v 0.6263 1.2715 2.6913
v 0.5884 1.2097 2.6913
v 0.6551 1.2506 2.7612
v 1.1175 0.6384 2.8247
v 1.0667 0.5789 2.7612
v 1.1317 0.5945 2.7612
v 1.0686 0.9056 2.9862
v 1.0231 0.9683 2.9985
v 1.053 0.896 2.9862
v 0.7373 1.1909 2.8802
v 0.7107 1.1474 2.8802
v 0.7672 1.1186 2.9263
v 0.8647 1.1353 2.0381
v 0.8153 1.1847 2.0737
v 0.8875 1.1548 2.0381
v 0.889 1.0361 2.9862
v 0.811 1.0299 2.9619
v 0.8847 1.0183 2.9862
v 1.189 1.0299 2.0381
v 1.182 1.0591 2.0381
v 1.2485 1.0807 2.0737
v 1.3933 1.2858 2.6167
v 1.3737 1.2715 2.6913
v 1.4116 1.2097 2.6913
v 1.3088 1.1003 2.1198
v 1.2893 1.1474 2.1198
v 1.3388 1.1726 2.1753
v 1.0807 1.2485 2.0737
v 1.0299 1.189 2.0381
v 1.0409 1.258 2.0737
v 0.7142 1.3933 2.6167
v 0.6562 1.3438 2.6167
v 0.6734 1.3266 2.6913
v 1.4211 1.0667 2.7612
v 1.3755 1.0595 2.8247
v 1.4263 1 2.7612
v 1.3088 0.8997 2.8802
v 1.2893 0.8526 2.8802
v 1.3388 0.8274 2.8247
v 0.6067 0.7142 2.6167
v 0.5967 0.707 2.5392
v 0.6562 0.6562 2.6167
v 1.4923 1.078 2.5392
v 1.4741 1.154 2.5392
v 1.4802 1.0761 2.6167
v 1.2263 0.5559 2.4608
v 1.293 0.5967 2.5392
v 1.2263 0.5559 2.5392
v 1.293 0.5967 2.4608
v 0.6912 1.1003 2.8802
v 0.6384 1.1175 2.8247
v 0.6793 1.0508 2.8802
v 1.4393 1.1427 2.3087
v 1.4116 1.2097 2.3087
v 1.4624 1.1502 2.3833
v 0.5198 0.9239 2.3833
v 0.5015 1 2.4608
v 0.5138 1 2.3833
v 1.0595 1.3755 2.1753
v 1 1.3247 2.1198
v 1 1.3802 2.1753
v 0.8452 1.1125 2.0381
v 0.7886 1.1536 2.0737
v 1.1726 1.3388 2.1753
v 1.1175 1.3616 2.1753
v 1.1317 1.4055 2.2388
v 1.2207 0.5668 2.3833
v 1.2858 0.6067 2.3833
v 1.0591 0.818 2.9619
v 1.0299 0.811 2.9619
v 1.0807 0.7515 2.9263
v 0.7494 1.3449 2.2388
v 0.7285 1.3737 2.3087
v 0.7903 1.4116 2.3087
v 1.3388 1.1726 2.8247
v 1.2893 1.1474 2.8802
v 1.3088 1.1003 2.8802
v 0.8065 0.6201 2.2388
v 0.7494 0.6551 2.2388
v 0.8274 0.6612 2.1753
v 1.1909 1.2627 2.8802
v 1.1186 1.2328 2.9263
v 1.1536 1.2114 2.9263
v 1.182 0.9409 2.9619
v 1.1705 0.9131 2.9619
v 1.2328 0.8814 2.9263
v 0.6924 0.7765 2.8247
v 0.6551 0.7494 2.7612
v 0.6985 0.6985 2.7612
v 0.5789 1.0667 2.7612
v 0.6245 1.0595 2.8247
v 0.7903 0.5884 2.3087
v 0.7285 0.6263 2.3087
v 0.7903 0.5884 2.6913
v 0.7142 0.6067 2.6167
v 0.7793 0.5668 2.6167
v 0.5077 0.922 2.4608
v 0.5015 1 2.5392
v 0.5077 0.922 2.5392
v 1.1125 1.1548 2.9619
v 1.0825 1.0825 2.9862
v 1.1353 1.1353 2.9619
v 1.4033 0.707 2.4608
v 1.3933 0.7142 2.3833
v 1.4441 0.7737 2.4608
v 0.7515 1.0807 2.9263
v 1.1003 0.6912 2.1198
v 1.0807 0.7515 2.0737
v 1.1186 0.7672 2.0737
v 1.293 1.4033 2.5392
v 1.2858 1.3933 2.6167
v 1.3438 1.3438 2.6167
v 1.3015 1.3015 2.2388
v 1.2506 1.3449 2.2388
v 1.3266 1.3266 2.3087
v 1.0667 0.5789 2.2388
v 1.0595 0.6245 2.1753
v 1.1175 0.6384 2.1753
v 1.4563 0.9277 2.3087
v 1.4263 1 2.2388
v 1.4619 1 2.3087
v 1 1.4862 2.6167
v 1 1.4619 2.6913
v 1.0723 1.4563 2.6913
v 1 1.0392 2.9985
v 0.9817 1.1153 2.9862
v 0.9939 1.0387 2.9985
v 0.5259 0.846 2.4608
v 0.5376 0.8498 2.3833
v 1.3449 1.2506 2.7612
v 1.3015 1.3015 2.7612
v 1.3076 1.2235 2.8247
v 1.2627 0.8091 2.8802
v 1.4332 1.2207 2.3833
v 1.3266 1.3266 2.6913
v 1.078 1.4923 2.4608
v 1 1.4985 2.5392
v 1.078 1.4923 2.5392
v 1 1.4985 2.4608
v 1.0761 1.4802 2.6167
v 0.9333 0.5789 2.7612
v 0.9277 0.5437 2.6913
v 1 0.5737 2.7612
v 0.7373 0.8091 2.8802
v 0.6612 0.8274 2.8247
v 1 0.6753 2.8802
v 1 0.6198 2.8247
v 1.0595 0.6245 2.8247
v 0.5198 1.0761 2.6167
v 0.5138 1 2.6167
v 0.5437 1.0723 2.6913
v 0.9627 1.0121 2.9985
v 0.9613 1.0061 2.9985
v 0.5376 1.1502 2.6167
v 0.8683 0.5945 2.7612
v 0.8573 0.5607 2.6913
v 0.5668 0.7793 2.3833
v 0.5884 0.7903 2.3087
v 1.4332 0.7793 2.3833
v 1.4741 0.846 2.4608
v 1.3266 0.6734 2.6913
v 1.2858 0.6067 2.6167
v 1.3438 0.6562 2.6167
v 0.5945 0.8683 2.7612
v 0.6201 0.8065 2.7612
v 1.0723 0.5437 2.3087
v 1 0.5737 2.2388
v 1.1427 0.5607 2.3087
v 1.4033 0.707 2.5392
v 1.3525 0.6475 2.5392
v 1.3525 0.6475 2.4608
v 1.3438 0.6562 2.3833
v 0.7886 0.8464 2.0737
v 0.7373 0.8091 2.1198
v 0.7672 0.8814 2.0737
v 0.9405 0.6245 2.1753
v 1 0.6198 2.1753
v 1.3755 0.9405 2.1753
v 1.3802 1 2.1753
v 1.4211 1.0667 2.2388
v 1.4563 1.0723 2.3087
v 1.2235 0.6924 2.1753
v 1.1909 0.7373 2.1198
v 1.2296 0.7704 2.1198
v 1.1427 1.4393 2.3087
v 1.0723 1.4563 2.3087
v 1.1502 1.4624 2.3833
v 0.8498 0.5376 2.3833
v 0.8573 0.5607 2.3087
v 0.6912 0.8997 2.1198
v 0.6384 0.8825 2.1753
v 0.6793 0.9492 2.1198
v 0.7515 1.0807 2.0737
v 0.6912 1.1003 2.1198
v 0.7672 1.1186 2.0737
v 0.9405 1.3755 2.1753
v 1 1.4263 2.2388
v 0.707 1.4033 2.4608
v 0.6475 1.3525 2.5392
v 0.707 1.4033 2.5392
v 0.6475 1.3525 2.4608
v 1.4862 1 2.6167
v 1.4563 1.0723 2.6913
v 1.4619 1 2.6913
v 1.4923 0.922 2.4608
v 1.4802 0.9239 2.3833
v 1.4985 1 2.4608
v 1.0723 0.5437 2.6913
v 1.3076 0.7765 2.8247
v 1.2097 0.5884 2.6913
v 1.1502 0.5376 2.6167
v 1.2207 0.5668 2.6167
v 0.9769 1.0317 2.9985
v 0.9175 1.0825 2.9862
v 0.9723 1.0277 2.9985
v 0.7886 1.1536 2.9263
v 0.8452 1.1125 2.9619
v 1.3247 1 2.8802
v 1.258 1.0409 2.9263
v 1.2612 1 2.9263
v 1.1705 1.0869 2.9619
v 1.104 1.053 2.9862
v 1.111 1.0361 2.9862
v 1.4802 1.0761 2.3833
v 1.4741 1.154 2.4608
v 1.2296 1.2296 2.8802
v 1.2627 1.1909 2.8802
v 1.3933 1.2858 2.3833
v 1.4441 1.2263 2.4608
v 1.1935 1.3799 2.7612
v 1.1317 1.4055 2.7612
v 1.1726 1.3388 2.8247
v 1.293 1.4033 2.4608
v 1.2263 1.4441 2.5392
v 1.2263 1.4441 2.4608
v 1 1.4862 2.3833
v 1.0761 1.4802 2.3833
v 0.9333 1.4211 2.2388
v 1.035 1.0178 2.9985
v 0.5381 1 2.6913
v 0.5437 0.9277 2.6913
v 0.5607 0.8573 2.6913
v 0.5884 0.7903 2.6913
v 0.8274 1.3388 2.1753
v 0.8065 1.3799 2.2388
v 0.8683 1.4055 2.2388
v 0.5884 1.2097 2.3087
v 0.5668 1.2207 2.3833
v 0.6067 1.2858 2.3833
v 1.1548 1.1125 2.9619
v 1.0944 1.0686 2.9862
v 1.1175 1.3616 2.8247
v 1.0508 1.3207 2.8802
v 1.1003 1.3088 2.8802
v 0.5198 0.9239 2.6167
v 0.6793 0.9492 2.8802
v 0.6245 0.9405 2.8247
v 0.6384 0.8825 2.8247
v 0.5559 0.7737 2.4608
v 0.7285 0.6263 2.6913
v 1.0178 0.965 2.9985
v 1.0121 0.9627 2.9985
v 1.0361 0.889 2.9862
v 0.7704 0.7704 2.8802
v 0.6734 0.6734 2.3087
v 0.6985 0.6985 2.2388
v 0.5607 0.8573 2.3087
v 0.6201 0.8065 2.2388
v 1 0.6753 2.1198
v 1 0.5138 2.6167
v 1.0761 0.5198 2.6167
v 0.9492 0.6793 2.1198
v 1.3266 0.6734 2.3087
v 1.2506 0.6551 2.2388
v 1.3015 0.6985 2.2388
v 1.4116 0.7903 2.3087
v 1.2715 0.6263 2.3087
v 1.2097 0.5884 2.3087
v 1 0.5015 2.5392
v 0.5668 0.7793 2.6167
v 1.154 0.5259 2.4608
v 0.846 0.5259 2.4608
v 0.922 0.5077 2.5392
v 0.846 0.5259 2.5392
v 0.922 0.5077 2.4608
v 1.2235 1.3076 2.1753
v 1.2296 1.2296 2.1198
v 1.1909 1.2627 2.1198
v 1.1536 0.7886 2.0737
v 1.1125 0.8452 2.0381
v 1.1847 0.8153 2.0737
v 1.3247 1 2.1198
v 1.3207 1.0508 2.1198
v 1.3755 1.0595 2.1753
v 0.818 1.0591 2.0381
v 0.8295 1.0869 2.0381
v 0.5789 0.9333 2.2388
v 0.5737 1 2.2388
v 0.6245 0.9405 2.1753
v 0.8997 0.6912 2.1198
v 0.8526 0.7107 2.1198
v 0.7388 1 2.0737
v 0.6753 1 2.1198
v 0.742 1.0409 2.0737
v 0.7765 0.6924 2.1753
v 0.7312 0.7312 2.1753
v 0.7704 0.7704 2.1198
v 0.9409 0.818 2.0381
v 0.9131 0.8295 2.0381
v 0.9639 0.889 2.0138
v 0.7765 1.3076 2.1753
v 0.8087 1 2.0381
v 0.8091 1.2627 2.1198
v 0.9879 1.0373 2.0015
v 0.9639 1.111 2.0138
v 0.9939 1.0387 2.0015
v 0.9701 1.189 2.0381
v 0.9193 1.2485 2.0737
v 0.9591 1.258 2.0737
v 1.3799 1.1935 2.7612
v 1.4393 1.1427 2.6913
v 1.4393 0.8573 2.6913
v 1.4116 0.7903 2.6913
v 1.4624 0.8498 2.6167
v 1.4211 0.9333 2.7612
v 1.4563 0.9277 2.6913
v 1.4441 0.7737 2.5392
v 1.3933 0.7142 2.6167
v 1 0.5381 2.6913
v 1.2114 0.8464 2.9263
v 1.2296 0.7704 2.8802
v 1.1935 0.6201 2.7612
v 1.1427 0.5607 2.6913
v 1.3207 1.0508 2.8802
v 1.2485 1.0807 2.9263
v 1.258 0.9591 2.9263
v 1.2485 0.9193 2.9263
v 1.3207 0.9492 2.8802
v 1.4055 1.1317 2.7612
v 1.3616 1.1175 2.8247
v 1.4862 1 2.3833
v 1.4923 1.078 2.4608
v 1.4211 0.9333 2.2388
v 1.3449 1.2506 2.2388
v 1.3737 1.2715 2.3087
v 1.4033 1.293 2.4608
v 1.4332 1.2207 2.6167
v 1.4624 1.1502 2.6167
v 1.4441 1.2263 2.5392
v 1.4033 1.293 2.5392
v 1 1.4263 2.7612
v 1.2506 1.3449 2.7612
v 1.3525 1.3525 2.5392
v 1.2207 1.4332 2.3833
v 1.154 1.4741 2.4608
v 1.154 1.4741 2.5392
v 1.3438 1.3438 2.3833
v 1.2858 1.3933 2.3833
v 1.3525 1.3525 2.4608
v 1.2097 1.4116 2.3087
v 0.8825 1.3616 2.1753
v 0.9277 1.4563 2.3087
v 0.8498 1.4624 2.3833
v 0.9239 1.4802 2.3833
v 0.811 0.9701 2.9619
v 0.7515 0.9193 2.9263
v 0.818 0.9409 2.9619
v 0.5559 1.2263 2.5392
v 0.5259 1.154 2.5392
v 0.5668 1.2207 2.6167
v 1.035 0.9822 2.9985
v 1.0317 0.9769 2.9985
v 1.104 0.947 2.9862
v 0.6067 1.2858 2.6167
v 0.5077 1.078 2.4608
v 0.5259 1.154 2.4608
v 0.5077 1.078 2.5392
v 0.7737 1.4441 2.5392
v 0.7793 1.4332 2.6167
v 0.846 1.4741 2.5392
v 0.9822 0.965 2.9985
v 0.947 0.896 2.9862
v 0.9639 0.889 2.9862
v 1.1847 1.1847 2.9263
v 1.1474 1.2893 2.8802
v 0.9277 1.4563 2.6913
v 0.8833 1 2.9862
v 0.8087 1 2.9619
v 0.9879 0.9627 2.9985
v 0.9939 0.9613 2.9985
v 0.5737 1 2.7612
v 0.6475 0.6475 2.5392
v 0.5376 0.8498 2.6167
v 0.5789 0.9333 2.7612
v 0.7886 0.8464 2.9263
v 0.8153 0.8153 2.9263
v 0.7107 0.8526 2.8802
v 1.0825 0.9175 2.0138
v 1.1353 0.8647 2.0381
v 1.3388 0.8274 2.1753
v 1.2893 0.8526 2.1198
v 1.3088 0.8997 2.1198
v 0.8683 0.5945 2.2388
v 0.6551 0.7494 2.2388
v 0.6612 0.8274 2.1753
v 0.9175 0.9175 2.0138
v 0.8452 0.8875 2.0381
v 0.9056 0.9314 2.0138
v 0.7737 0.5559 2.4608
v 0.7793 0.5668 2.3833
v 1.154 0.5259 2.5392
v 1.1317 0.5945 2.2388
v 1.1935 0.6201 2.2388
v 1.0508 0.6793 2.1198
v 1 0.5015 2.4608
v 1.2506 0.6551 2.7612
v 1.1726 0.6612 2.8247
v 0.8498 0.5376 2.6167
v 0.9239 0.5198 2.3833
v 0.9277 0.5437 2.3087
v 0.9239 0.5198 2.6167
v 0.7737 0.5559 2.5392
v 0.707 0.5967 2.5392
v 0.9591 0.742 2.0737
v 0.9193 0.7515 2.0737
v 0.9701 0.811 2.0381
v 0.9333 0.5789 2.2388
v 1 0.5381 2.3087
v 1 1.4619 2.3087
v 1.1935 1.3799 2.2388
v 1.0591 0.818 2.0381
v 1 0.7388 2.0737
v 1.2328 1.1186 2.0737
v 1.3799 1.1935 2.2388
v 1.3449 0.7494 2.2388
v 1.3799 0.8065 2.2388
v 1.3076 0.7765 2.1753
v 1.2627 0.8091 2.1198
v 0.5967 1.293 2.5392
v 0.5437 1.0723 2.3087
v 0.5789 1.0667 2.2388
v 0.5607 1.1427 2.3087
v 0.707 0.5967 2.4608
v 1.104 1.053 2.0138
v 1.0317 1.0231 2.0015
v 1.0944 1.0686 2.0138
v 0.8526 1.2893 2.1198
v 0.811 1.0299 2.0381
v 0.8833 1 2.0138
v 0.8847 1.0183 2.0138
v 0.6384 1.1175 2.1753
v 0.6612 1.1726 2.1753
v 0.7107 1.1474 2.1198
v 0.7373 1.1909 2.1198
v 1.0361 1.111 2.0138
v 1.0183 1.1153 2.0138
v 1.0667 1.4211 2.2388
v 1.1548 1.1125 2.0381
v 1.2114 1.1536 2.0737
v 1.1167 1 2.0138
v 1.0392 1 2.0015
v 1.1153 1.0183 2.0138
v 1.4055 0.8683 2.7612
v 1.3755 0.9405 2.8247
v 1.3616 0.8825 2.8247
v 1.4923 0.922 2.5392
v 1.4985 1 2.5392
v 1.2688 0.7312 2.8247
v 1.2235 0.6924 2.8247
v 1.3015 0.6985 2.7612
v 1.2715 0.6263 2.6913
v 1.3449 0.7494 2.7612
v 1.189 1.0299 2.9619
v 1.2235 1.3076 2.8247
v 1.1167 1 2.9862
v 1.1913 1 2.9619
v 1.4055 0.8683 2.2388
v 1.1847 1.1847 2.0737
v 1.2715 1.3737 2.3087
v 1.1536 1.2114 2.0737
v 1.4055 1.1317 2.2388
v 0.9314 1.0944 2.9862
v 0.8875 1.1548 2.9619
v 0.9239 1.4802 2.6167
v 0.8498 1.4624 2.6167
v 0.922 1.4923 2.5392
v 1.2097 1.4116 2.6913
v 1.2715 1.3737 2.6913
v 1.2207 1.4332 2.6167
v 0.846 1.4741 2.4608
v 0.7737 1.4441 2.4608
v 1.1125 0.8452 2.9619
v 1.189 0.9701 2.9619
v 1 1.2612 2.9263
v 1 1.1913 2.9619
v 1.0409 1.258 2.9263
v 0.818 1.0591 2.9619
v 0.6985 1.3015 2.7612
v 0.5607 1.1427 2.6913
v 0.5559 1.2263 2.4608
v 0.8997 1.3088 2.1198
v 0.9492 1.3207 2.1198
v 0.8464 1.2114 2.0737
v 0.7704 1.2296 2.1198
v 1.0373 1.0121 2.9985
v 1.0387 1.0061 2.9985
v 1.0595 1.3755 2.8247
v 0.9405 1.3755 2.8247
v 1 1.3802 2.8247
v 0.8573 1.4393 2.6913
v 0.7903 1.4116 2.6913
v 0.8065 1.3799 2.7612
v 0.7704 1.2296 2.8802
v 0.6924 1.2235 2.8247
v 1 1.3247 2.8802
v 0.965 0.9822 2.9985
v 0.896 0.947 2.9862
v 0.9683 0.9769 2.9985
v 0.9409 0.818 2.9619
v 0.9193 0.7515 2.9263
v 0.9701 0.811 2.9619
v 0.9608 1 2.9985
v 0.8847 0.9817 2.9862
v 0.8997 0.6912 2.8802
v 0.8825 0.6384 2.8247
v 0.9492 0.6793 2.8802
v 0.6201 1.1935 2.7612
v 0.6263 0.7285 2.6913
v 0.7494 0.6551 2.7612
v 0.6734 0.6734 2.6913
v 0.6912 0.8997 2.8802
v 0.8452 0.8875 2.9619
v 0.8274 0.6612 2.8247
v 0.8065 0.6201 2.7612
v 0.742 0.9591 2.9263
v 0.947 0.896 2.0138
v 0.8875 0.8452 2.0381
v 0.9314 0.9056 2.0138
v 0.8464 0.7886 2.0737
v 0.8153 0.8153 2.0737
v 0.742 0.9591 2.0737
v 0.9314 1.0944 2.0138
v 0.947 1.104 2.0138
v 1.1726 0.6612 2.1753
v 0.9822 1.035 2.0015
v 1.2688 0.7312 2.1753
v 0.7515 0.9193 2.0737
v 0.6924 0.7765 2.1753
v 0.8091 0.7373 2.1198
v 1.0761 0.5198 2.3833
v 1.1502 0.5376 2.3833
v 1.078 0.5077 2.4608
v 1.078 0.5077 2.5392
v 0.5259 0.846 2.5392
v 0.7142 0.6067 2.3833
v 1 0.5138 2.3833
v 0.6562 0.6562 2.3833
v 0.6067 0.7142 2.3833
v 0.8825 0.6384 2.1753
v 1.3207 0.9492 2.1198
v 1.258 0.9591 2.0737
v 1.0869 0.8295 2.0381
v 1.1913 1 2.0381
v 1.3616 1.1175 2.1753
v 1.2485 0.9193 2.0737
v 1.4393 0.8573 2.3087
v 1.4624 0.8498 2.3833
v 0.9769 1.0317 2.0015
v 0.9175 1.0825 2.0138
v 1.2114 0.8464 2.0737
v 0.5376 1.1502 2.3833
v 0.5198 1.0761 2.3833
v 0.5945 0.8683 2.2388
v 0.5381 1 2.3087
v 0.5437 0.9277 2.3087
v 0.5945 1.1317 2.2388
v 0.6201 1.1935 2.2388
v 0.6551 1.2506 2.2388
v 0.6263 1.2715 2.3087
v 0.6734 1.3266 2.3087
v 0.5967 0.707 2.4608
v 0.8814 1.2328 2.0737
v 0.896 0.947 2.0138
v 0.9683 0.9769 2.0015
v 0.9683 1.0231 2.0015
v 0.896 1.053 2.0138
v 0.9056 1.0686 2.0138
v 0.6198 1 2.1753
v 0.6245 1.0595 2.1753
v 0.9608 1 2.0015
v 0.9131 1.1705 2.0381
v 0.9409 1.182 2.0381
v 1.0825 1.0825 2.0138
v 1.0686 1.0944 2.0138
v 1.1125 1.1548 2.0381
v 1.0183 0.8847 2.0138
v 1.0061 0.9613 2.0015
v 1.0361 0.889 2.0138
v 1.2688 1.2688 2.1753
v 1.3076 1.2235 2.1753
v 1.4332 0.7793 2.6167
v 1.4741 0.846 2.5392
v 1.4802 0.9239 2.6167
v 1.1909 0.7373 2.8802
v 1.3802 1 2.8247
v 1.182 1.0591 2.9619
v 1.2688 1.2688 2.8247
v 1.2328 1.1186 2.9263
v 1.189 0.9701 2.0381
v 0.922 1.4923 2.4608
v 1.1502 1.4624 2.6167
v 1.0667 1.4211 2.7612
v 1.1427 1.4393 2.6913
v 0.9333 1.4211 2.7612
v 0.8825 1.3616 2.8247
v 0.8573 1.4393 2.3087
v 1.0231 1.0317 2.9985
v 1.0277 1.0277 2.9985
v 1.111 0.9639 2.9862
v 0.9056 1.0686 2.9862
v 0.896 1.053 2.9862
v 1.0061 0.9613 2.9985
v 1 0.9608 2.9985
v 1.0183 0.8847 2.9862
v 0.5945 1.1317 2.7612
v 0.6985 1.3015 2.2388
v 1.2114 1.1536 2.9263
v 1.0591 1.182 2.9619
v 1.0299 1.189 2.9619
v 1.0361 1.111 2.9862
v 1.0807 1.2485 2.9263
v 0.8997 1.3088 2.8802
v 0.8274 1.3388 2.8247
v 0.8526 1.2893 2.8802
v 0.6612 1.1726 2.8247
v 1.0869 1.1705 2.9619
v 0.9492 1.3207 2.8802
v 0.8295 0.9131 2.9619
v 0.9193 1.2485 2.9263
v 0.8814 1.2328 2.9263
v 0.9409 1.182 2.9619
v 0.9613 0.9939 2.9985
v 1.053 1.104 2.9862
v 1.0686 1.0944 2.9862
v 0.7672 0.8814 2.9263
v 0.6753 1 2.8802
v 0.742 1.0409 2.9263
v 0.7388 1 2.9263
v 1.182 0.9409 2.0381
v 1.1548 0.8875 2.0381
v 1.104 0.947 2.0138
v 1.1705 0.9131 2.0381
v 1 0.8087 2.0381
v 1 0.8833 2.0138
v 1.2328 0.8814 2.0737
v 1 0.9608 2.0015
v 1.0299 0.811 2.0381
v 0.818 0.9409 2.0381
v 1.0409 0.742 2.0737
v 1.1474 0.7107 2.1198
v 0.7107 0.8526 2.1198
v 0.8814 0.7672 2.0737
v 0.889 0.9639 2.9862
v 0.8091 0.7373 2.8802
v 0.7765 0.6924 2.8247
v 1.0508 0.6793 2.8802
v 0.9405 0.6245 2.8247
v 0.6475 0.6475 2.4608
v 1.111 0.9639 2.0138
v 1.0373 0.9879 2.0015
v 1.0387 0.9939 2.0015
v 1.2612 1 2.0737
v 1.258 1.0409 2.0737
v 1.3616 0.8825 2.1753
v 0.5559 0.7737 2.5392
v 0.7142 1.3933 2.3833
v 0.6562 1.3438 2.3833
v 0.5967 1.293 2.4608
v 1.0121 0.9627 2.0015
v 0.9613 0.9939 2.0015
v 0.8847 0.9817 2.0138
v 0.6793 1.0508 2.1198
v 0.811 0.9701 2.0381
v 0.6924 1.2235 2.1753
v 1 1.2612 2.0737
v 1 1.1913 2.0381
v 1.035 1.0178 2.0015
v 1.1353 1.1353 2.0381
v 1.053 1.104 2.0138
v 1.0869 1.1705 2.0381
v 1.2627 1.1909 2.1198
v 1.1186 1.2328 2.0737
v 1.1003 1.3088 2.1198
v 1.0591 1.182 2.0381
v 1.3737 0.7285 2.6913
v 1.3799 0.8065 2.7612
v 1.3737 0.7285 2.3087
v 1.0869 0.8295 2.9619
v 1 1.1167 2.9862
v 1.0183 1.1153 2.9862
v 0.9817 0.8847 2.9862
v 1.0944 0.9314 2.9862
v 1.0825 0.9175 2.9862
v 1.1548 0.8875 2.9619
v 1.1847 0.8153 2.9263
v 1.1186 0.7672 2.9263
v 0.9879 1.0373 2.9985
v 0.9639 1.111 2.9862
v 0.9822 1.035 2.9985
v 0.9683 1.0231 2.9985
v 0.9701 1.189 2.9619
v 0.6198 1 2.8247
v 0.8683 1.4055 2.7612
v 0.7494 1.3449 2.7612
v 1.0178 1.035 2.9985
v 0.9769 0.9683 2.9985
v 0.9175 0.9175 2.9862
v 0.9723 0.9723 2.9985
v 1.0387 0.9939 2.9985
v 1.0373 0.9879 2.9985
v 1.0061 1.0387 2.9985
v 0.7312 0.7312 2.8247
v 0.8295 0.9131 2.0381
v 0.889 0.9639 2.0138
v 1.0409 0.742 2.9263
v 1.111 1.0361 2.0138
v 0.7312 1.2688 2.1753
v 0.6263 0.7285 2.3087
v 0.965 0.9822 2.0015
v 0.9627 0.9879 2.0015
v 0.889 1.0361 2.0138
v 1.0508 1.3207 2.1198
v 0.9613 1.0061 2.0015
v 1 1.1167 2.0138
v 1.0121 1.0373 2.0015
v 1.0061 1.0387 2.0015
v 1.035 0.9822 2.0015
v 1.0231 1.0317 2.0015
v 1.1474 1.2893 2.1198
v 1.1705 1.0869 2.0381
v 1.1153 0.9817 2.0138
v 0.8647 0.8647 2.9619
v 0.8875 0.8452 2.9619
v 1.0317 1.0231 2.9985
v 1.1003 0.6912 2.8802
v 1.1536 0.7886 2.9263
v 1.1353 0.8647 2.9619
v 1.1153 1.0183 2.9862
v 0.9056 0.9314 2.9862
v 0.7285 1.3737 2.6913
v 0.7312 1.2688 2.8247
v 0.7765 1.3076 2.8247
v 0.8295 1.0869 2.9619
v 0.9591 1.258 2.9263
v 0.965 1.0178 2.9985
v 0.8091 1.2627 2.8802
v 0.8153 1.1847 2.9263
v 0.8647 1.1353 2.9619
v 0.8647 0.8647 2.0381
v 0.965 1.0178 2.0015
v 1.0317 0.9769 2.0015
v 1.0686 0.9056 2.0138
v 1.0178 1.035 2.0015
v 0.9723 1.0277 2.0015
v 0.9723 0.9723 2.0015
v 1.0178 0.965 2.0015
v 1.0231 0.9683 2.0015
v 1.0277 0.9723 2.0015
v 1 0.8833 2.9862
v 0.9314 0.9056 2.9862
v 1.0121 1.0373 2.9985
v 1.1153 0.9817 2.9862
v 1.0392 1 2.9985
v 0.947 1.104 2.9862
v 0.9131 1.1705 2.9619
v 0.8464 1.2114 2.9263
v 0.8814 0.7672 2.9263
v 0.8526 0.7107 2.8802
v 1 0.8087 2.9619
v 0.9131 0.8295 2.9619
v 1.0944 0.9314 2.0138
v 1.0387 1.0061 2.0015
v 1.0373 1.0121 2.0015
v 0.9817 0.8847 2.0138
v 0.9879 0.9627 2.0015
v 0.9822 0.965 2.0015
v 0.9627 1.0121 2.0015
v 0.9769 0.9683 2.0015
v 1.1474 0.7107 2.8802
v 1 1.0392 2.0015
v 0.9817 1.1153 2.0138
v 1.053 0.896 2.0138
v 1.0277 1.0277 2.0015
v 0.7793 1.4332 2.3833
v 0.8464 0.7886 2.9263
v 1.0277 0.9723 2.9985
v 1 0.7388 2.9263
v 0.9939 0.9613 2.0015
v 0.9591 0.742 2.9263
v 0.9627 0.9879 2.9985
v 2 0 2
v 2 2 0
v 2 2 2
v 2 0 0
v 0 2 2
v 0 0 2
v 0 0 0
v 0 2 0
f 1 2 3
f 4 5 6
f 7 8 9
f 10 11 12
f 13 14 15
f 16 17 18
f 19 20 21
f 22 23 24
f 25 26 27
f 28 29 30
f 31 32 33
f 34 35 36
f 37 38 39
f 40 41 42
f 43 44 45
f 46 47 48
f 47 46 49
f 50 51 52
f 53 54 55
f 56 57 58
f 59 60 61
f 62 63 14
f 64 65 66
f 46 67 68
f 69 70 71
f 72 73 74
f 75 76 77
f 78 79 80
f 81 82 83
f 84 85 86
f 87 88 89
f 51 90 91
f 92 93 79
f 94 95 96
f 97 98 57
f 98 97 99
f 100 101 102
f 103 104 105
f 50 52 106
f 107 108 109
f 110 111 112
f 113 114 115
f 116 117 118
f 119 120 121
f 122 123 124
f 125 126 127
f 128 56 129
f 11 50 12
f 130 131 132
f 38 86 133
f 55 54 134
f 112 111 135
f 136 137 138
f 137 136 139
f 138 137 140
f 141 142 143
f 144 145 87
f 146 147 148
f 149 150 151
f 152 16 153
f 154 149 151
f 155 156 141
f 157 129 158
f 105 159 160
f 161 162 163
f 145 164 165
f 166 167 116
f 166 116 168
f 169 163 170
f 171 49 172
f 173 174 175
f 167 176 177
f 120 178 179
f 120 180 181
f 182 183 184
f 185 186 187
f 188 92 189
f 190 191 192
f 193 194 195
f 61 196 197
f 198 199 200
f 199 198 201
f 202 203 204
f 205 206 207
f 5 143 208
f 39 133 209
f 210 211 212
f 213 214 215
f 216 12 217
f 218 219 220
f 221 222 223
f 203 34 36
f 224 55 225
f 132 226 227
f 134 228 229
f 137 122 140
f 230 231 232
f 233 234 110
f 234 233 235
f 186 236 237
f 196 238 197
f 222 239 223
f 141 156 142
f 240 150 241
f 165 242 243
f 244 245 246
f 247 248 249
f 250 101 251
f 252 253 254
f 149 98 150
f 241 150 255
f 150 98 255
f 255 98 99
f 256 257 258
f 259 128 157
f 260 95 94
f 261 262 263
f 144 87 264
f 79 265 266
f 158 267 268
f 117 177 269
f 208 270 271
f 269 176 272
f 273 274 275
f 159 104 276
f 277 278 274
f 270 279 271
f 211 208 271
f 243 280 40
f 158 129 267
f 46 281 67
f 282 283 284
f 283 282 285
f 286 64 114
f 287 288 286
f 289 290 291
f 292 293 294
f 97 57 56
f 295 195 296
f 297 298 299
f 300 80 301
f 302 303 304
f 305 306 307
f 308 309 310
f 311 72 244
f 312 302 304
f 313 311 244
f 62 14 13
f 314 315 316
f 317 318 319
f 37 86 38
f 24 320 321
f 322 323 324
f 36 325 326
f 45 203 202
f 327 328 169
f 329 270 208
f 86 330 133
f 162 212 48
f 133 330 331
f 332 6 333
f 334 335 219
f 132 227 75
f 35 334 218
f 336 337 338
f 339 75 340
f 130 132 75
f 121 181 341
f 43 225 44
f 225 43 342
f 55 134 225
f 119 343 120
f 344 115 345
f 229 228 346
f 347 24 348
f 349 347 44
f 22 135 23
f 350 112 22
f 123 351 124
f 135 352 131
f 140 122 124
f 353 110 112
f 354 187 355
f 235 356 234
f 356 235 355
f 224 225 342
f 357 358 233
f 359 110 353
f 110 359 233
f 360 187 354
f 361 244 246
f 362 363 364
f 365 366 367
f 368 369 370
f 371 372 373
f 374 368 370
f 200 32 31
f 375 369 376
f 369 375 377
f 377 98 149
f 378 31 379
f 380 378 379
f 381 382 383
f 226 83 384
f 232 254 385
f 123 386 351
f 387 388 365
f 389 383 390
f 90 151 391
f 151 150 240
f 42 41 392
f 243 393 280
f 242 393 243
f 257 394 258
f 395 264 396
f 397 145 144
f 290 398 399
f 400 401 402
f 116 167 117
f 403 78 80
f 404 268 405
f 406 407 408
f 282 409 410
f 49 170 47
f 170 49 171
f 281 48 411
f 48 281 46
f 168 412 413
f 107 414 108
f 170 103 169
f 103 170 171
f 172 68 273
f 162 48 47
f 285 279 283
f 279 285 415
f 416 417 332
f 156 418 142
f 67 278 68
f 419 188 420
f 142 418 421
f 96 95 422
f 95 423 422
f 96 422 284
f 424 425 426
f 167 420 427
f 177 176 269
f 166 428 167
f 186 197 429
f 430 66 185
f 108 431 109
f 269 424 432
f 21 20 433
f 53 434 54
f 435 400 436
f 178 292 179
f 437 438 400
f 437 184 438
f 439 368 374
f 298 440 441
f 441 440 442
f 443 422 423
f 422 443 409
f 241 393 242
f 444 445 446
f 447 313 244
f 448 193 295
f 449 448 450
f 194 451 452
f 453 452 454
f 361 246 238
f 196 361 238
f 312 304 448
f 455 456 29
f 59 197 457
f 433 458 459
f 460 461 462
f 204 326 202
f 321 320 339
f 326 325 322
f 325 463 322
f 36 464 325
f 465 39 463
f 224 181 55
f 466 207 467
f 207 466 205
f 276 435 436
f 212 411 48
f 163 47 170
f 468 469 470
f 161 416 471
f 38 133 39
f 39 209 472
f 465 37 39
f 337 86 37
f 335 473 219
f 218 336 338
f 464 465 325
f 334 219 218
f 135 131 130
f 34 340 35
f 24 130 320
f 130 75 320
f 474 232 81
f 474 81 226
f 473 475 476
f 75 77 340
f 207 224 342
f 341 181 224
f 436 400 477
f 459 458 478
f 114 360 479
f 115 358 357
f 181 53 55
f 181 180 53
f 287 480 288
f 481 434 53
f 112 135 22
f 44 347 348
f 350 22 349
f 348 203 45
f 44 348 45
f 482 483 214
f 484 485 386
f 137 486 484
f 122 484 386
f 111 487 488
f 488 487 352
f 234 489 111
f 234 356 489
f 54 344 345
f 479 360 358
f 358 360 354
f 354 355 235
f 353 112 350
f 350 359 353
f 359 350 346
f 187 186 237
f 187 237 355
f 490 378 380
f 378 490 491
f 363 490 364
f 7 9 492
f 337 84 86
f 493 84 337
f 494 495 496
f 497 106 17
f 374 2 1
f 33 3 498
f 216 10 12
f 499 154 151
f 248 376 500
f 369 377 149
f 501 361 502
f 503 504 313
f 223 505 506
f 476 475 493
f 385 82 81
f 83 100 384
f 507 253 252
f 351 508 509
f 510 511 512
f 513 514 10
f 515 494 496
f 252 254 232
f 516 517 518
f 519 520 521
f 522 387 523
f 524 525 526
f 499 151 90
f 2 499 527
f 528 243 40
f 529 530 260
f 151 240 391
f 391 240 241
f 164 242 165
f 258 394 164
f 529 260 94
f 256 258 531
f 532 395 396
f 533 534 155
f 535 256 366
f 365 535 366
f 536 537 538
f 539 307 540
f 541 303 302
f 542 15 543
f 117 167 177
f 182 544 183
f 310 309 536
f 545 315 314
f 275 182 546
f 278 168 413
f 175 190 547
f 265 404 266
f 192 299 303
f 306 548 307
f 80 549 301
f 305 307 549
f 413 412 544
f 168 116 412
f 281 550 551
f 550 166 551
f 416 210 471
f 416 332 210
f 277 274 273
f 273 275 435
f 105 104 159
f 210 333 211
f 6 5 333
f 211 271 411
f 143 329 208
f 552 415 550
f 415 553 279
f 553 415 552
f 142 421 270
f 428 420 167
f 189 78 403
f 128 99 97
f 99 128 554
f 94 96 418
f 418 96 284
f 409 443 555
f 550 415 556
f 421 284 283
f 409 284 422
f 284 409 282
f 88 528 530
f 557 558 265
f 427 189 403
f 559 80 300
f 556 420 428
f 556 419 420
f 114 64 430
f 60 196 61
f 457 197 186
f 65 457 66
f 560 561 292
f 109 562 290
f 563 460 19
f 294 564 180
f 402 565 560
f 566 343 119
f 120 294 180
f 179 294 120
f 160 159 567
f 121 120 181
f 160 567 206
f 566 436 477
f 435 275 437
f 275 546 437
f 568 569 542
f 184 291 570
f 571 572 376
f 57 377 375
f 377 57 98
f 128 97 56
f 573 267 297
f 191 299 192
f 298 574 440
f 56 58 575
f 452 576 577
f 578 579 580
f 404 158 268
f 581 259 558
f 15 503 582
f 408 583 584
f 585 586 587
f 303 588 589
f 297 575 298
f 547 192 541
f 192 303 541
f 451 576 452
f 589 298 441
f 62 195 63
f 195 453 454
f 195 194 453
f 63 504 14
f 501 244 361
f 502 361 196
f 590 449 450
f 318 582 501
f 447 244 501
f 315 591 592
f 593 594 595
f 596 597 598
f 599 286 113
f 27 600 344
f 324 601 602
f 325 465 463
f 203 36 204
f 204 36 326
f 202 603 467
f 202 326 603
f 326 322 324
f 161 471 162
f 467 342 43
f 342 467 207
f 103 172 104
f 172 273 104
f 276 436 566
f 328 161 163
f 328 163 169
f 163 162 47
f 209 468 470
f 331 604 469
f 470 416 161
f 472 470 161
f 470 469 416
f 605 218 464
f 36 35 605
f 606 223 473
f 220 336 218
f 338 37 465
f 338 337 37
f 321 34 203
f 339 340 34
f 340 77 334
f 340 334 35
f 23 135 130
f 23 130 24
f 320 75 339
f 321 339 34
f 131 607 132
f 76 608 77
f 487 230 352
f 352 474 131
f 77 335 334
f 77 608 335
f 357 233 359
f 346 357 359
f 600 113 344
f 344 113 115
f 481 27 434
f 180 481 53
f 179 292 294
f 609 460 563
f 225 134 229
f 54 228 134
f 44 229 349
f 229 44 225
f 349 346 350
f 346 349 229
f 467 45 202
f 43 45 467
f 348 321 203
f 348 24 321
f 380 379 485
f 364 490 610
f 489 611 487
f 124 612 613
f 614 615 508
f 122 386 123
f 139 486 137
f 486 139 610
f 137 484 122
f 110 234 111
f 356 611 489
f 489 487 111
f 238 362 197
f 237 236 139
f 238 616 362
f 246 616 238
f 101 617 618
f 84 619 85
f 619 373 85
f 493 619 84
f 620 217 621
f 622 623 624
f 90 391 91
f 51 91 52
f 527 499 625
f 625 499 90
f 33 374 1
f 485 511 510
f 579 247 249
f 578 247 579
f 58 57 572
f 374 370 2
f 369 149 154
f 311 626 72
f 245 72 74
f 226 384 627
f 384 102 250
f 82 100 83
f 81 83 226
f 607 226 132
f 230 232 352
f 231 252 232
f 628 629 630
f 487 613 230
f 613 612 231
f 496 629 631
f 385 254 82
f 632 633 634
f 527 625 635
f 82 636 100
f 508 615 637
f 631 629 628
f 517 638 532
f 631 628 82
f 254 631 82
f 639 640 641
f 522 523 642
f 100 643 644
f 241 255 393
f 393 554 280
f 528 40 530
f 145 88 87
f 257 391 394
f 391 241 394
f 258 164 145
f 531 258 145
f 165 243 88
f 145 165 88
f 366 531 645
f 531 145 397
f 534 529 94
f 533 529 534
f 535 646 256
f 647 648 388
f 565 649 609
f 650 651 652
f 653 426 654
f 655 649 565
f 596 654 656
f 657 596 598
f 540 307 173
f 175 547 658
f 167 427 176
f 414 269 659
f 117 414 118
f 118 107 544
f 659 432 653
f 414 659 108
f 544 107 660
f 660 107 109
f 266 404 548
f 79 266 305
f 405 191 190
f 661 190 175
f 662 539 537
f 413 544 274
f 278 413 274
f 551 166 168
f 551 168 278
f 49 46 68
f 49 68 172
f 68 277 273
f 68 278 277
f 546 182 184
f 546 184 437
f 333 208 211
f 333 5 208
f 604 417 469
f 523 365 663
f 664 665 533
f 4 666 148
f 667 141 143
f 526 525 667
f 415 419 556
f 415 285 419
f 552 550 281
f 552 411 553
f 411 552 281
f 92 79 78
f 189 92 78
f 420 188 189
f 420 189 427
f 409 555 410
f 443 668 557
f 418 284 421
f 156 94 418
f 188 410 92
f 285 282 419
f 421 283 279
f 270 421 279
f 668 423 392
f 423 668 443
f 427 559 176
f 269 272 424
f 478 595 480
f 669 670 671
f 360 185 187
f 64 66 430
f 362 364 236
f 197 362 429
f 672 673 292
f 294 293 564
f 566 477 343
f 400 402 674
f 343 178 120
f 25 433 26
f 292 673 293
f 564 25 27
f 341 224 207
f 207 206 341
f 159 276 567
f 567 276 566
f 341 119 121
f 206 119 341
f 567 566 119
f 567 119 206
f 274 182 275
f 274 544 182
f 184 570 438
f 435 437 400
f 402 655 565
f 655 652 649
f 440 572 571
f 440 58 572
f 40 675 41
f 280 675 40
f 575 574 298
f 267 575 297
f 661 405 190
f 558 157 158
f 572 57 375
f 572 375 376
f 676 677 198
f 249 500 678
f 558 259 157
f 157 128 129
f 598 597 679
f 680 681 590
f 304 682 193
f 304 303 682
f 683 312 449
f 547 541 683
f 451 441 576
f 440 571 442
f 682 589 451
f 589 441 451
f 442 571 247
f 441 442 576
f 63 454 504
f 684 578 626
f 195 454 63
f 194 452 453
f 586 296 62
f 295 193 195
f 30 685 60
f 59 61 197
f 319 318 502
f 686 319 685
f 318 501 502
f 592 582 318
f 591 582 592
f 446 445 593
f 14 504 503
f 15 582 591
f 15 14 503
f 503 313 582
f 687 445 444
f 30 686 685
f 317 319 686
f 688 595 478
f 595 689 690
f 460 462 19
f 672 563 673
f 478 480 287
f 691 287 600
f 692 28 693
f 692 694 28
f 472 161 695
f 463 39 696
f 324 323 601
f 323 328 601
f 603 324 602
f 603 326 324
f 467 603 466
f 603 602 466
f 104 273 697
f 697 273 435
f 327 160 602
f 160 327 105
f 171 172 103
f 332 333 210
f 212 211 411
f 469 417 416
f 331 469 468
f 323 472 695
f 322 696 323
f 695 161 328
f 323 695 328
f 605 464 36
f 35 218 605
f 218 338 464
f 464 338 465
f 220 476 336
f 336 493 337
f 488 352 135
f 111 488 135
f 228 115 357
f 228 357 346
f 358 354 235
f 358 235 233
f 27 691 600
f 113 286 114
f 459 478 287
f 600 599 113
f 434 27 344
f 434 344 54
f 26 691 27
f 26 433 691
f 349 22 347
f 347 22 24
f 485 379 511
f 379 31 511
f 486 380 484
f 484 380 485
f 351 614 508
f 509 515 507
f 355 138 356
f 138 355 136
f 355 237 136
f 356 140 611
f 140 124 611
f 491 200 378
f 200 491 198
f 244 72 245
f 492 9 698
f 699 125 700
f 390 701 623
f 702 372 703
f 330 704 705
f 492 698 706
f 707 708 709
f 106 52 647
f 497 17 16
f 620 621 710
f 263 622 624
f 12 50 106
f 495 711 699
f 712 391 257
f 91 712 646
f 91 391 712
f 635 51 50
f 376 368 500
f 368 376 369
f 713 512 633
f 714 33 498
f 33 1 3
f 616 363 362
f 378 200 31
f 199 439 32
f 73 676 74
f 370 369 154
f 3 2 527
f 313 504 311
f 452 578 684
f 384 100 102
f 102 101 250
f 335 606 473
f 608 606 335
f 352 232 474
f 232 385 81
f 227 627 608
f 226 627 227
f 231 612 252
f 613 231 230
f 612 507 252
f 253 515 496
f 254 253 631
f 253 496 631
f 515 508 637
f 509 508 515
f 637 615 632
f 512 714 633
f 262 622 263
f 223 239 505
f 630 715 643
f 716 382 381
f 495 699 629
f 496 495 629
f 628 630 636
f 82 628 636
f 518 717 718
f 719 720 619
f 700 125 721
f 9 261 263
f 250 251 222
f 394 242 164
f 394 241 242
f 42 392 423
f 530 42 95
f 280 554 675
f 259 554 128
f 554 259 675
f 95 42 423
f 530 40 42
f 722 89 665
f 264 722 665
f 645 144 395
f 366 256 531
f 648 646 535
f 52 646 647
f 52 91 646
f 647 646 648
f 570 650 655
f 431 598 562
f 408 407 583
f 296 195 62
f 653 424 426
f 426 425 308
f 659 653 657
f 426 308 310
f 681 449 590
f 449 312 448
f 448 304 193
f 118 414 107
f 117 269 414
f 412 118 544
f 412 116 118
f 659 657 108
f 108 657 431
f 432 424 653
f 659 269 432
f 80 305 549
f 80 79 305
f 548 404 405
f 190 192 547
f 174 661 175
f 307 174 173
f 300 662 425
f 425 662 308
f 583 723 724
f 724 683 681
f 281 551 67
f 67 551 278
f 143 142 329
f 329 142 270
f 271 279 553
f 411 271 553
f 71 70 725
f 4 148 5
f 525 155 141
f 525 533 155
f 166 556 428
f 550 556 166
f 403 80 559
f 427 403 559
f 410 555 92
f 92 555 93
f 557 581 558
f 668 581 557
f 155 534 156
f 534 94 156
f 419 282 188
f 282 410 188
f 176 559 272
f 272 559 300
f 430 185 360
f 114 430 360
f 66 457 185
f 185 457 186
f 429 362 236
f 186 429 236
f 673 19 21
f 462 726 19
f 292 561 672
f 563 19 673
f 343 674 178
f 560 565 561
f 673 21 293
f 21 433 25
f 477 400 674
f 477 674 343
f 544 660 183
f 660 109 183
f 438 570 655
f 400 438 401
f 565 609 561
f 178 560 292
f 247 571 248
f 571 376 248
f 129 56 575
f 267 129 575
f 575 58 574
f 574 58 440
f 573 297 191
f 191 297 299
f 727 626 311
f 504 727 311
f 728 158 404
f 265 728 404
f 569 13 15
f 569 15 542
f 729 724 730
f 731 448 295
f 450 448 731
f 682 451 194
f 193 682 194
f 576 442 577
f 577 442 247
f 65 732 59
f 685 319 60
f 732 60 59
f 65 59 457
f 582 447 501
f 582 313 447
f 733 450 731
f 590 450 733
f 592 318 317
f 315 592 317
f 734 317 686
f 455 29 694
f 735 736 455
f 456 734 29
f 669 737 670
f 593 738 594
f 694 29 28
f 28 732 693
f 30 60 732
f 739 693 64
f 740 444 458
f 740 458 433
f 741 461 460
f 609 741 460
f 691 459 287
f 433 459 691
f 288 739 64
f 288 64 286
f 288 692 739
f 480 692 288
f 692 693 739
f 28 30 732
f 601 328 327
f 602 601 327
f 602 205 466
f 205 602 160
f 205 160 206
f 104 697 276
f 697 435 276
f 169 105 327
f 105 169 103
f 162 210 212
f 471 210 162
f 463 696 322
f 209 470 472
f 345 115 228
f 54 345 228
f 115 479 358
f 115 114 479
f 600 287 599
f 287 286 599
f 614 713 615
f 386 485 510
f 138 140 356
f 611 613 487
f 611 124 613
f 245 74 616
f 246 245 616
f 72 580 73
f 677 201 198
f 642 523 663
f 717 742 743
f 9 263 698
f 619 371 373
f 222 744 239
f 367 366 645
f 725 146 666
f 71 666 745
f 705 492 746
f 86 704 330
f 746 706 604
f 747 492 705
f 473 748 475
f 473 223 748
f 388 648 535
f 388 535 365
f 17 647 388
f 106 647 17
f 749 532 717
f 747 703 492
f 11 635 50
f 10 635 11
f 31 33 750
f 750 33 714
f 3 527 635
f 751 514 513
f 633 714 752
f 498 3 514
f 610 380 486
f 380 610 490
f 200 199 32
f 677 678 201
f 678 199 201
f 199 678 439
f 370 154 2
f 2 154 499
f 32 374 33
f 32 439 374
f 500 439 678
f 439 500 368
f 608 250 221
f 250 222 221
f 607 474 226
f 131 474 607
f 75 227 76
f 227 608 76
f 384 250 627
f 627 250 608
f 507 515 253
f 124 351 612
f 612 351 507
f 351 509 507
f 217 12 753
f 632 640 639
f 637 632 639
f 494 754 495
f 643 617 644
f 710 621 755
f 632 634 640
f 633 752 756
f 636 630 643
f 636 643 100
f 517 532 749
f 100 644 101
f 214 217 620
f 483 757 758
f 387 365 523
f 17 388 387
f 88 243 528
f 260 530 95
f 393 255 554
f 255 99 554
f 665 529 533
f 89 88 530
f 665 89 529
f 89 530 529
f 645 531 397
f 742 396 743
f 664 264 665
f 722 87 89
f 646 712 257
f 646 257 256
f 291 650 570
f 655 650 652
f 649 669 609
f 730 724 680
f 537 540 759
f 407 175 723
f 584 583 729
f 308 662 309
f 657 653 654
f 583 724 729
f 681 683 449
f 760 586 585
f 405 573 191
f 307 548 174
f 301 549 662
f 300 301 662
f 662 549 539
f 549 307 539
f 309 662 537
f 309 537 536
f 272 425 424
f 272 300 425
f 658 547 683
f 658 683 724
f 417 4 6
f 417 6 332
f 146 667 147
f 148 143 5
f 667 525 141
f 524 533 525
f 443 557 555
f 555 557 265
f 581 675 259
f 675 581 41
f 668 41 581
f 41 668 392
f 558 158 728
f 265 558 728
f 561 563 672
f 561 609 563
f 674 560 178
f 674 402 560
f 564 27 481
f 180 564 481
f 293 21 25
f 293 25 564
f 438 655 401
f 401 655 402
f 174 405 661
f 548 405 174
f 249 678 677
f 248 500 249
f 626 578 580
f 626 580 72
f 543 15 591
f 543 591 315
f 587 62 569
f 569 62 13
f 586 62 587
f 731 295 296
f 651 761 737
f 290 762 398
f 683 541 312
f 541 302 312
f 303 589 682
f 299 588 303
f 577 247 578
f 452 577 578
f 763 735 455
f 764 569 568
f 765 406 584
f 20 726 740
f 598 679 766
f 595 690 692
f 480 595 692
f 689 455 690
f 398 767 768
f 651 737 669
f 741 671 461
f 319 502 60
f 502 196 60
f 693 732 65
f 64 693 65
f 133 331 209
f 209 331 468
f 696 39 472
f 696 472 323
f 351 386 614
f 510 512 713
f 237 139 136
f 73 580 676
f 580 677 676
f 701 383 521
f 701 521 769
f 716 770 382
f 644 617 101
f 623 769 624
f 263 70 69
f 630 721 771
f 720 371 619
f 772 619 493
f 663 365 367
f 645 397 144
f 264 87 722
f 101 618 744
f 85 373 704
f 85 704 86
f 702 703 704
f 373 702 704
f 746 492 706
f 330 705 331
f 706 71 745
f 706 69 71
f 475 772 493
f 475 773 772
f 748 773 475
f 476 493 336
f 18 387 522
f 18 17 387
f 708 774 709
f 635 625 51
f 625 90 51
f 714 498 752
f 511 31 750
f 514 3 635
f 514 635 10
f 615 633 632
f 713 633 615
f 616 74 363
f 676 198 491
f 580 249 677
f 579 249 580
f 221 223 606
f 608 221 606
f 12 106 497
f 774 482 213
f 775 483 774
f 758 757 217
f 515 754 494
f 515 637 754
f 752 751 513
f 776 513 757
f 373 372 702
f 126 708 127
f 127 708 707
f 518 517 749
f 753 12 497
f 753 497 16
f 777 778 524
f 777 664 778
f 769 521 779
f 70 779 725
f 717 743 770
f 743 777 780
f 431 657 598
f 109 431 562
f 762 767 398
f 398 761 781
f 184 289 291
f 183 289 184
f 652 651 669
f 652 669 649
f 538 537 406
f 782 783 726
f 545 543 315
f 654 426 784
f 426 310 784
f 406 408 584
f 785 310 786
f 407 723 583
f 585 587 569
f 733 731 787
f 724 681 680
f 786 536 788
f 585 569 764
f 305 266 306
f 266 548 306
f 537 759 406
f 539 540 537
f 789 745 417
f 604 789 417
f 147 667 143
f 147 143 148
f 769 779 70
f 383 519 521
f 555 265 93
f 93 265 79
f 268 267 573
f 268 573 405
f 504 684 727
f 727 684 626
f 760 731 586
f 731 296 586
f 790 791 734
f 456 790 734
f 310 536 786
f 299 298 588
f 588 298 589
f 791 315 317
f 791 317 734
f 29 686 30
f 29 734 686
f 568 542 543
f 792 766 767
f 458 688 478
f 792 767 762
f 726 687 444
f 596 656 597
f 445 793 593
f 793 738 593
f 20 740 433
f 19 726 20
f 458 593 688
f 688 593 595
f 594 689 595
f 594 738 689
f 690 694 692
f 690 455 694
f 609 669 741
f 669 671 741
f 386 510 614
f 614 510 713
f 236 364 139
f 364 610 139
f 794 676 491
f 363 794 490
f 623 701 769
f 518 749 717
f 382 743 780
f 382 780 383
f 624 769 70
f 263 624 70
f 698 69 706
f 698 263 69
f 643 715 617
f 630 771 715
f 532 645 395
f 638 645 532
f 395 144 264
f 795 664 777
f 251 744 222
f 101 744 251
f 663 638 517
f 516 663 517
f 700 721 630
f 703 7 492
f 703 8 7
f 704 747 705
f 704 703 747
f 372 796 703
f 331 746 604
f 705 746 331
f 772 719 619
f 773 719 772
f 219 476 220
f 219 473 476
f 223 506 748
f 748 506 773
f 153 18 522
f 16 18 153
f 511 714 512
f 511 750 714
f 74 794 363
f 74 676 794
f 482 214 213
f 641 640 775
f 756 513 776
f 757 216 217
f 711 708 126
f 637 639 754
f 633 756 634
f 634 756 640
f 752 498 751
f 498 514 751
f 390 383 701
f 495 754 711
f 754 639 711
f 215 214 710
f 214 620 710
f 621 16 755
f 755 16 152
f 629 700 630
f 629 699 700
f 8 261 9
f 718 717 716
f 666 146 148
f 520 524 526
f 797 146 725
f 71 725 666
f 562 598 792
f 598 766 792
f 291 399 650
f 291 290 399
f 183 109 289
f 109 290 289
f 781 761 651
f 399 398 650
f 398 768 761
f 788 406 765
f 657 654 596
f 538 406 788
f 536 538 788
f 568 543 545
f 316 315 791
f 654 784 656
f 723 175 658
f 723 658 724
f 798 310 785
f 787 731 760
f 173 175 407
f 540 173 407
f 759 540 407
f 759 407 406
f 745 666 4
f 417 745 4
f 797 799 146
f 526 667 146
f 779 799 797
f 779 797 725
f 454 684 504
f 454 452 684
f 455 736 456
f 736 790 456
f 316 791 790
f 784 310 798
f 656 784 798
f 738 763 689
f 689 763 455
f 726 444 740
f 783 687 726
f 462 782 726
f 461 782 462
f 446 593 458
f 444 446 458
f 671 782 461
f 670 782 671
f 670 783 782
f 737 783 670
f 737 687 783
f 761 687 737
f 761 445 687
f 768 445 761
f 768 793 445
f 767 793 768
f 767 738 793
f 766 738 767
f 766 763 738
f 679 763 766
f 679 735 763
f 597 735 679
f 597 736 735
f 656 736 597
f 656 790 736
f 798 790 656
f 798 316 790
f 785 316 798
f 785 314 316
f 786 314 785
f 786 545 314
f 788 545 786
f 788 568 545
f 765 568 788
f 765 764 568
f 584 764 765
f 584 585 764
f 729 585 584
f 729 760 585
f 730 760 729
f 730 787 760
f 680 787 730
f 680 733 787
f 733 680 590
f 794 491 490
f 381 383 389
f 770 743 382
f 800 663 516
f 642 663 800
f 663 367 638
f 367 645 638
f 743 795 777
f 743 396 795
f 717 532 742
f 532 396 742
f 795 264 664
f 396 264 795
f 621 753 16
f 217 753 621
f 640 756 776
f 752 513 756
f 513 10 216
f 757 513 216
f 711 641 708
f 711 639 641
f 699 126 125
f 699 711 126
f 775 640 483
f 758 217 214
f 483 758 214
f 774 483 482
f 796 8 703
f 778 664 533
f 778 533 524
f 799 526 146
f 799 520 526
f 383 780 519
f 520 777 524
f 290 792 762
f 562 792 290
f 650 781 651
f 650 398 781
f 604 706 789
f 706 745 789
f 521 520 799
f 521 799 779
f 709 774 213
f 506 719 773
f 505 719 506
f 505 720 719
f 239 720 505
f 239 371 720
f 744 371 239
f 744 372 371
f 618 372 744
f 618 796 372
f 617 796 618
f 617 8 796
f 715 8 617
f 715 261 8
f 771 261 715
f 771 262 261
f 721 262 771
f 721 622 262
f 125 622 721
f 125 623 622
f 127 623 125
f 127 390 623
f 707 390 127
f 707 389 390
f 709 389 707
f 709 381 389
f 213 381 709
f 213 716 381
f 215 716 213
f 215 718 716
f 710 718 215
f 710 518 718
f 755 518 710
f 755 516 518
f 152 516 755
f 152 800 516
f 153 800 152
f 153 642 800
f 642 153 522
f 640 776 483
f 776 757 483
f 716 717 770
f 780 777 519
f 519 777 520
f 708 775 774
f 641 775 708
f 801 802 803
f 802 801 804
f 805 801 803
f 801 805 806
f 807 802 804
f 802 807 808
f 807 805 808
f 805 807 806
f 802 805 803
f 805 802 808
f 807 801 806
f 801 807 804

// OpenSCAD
// Blue Sphere
color("blue")
translate([1, 1, 2.5])
sphere(0.5, $fn=40);

// Orange Cube
color("orange")
cube(2);
